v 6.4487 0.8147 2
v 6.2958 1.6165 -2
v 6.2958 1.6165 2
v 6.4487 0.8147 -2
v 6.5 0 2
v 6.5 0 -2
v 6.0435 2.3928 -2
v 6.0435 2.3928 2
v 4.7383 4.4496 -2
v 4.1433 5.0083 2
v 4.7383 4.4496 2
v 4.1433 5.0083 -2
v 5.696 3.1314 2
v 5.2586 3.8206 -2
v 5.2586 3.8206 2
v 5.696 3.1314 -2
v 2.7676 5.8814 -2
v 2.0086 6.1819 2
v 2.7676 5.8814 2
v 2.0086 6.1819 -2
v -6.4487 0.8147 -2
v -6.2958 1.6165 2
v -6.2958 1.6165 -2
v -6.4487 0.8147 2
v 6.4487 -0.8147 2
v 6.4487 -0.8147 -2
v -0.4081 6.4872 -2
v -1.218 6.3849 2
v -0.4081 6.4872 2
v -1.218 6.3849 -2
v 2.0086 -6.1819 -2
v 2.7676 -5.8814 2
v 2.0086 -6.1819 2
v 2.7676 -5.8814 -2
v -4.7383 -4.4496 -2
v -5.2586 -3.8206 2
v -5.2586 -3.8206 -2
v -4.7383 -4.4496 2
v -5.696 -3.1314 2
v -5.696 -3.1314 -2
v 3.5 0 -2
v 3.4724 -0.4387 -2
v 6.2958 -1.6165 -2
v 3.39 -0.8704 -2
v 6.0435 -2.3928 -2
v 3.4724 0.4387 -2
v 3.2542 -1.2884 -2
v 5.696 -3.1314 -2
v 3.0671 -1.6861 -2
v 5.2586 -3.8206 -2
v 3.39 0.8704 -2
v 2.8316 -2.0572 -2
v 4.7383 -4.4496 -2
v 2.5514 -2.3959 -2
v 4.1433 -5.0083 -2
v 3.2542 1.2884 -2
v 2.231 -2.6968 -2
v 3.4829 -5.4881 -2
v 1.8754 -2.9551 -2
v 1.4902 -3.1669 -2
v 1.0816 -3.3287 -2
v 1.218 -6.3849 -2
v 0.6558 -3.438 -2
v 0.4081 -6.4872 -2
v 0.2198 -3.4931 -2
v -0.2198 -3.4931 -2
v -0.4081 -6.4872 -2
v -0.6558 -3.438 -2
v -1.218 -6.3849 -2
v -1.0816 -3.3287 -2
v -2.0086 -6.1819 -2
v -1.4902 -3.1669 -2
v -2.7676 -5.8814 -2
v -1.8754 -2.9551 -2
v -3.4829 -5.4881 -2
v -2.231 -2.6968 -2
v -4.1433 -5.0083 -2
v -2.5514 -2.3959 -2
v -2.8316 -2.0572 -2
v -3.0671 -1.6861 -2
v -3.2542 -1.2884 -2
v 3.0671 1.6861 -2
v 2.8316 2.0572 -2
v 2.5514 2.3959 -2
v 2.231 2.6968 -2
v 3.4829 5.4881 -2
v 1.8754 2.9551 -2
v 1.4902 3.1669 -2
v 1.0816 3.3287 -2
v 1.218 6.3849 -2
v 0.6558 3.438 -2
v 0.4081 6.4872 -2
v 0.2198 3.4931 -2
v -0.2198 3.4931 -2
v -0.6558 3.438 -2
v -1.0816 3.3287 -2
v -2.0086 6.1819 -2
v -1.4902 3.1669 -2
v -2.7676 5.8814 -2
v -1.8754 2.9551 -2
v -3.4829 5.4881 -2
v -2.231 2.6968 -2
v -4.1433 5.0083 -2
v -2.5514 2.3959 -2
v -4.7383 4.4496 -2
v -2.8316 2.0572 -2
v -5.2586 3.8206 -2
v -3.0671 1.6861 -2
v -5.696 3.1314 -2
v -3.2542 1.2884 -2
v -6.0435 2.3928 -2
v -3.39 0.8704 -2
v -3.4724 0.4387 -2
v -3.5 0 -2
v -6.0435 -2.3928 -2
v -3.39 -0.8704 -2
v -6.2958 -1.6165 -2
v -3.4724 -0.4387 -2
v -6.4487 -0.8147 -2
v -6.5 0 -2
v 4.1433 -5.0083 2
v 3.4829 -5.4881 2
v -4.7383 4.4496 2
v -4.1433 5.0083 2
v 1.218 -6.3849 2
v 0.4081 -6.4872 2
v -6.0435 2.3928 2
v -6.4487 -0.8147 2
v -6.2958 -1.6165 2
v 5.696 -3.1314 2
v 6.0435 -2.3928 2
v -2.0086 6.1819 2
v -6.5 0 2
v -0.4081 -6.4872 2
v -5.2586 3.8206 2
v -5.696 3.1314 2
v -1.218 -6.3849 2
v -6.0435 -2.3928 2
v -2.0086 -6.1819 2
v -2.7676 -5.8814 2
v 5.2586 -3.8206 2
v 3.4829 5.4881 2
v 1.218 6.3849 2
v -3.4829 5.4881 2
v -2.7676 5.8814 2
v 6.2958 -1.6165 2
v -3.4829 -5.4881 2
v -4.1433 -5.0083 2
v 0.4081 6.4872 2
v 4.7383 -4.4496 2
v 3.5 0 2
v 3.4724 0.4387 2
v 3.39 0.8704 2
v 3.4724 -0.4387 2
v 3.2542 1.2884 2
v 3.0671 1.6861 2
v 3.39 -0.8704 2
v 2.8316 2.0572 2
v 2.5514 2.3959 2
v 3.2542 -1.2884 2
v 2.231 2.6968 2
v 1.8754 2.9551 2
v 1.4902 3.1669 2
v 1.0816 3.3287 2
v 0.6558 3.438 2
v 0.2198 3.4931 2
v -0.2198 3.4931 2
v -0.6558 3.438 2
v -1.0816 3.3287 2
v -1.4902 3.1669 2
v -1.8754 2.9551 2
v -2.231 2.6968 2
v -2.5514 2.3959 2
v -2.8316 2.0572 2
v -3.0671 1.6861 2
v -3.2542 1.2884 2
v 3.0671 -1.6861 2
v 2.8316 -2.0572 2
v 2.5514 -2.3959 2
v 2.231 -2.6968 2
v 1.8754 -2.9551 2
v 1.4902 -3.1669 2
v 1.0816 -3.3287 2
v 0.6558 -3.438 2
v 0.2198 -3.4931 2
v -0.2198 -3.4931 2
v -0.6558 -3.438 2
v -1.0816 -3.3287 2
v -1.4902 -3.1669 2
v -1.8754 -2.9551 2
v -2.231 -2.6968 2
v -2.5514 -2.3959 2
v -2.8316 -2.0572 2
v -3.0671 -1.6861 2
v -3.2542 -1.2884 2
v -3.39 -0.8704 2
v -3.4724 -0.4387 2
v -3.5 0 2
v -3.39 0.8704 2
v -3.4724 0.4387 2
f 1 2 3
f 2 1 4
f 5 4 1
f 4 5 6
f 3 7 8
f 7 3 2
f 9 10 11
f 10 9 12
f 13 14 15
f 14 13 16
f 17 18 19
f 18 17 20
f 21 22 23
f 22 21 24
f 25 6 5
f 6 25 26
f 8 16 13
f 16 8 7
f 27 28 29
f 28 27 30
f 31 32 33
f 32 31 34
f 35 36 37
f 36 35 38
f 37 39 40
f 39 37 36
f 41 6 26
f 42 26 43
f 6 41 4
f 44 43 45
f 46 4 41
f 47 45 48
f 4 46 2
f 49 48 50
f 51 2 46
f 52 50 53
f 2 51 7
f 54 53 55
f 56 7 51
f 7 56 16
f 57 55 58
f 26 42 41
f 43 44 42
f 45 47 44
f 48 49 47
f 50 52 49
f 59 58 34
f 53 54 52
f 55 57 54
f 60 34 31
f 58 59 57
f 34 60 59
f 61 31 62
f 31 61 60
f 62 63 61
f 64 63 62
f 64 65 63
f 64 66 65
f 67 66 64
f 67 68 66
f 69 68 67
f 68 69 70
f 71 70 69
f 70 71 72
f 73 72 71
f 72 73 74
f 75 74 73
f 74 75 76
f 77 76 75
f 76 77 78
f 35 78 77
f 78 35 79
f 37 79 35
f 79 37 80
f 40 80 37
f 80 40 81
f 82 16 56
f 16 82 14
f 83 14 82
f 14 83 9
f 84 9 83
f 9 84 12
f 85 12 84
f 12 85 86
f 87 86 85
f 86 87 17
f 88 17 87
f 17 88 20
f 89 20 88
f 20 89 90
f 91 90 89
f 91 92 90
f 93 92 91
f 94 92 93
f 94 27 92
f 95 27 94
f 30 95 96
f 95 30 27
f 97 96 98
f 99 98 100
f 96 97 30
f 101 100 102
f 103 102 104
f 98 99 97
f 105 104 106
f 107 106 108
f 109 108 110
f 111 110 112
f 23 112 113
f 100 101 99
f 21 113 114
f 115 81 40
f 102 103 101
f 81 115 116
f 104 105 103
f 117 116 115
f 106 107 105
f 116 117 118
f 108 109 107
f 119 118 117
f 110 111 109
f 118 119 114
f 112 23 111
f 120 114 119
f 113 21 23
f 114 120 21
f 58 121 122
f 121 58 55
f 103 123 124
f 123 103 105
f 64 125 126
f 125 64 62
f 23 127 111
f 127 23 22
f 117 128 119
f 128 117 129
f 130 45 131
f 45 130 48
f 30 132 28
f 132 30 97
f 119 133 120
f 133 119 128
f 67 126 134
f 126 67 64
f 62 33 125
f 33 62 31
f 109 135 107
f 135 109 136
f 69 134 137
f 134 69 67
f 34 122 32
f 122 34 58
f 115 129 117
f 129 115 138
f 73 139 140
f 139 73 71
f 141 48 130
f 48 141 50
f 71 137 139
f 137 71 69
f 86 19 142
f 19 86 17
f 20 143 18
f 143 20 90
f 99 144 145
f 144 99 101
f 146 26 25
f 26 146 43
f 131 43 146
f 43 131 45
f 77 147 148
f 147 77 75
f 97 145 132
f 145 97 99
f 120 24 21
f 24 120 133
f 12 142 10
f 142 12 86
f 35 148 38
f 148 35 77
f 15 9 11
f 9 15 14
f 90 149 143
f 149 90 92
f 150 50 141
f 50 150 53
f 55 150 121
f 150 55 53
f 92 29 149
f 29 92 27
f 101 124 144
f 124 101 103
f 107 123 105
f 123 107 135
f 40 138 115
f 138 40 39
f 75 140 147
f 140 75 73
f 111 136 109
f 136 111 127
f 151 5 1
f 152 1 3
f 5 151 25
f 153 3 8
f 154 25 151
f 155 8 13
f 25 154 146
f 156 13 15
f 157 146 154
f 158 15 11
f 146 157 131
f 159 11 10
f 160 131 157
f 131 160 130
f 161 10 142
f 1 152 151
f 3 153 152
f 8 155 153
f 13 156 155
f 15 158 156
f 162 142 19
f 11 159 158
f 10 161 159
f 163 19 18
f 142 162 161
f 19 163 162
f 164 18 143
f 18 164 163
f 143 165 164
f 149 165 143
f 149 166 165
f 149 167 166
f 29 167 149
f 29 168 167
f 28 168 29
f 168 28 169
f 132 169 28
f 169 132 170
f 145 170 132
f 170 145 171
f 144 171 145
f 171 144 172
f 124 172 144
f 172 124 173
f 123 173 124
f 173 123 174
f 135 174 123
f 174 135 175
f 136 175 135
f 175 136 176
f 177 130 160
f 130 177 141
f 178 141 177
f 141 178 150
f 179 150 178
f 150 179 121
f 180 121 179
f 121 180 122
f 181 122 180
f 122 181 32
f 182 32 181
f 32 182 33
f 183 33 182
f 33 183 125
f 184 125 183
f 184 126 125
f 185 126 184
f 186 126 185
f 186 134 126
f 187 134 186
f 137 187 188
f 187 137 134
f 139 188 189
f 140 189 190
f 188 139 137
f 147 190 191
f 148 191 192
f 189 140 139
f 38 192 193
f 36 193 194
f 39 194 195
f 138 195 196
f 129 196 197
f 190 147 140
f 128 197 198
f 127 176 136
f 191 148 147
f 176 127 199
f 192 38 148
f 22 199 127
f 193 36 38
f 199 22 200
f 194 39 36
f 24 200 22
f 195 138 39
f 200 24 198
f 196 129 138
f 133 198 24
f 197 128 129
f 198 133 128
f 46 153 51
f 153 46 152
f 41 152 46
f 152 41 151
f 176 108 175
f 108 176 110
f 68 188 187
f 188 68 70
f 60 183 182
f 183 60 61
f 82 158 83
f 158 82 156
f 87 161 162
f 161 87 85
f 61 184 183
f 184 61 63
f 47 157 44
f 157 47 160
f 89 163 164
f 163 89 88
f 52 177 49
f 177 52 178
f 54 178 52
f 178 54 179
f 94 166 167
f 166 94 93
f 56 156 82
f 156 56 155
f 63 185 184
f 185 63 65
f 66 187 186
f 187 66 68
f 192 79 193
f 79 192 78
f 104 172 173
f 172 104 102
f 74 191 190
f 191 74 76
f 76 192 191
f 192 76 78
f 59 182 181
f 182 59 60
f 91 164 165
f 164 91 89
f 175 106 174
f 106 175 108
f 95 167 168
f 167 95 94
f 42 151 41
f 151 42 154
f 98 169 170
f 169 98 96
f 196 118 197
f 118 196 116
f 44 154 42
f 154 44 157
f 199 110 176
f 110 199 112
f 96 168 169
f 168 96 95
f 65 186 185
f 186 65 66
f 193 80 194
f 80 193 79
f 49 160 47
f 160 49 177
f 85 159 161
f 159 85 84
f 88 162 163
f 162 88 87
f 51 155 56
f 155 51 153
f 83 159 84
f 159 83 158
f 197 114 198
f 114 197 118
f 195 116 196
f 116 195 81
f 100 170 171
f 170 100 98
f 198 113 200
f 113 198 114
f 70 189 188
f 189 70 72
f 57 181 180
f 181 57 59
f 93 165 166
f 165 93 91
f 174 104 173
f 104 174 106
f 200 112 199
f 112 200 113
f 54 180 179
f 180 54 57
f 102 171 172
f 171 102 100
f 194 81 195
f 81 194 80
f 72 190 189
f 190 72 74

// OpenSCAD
$fn = 50;


difference() {
	union() {
		translate(v = [0, 0, -2.0000000000]) {
			cylinder(h = 4, r = 6.5000000000);
		}
	}
	union() {
		translate(v = [0, 0, -100.0000000000]) {
			cylinder(h = 200, r = 3.5000000000);
		}
	}
}
